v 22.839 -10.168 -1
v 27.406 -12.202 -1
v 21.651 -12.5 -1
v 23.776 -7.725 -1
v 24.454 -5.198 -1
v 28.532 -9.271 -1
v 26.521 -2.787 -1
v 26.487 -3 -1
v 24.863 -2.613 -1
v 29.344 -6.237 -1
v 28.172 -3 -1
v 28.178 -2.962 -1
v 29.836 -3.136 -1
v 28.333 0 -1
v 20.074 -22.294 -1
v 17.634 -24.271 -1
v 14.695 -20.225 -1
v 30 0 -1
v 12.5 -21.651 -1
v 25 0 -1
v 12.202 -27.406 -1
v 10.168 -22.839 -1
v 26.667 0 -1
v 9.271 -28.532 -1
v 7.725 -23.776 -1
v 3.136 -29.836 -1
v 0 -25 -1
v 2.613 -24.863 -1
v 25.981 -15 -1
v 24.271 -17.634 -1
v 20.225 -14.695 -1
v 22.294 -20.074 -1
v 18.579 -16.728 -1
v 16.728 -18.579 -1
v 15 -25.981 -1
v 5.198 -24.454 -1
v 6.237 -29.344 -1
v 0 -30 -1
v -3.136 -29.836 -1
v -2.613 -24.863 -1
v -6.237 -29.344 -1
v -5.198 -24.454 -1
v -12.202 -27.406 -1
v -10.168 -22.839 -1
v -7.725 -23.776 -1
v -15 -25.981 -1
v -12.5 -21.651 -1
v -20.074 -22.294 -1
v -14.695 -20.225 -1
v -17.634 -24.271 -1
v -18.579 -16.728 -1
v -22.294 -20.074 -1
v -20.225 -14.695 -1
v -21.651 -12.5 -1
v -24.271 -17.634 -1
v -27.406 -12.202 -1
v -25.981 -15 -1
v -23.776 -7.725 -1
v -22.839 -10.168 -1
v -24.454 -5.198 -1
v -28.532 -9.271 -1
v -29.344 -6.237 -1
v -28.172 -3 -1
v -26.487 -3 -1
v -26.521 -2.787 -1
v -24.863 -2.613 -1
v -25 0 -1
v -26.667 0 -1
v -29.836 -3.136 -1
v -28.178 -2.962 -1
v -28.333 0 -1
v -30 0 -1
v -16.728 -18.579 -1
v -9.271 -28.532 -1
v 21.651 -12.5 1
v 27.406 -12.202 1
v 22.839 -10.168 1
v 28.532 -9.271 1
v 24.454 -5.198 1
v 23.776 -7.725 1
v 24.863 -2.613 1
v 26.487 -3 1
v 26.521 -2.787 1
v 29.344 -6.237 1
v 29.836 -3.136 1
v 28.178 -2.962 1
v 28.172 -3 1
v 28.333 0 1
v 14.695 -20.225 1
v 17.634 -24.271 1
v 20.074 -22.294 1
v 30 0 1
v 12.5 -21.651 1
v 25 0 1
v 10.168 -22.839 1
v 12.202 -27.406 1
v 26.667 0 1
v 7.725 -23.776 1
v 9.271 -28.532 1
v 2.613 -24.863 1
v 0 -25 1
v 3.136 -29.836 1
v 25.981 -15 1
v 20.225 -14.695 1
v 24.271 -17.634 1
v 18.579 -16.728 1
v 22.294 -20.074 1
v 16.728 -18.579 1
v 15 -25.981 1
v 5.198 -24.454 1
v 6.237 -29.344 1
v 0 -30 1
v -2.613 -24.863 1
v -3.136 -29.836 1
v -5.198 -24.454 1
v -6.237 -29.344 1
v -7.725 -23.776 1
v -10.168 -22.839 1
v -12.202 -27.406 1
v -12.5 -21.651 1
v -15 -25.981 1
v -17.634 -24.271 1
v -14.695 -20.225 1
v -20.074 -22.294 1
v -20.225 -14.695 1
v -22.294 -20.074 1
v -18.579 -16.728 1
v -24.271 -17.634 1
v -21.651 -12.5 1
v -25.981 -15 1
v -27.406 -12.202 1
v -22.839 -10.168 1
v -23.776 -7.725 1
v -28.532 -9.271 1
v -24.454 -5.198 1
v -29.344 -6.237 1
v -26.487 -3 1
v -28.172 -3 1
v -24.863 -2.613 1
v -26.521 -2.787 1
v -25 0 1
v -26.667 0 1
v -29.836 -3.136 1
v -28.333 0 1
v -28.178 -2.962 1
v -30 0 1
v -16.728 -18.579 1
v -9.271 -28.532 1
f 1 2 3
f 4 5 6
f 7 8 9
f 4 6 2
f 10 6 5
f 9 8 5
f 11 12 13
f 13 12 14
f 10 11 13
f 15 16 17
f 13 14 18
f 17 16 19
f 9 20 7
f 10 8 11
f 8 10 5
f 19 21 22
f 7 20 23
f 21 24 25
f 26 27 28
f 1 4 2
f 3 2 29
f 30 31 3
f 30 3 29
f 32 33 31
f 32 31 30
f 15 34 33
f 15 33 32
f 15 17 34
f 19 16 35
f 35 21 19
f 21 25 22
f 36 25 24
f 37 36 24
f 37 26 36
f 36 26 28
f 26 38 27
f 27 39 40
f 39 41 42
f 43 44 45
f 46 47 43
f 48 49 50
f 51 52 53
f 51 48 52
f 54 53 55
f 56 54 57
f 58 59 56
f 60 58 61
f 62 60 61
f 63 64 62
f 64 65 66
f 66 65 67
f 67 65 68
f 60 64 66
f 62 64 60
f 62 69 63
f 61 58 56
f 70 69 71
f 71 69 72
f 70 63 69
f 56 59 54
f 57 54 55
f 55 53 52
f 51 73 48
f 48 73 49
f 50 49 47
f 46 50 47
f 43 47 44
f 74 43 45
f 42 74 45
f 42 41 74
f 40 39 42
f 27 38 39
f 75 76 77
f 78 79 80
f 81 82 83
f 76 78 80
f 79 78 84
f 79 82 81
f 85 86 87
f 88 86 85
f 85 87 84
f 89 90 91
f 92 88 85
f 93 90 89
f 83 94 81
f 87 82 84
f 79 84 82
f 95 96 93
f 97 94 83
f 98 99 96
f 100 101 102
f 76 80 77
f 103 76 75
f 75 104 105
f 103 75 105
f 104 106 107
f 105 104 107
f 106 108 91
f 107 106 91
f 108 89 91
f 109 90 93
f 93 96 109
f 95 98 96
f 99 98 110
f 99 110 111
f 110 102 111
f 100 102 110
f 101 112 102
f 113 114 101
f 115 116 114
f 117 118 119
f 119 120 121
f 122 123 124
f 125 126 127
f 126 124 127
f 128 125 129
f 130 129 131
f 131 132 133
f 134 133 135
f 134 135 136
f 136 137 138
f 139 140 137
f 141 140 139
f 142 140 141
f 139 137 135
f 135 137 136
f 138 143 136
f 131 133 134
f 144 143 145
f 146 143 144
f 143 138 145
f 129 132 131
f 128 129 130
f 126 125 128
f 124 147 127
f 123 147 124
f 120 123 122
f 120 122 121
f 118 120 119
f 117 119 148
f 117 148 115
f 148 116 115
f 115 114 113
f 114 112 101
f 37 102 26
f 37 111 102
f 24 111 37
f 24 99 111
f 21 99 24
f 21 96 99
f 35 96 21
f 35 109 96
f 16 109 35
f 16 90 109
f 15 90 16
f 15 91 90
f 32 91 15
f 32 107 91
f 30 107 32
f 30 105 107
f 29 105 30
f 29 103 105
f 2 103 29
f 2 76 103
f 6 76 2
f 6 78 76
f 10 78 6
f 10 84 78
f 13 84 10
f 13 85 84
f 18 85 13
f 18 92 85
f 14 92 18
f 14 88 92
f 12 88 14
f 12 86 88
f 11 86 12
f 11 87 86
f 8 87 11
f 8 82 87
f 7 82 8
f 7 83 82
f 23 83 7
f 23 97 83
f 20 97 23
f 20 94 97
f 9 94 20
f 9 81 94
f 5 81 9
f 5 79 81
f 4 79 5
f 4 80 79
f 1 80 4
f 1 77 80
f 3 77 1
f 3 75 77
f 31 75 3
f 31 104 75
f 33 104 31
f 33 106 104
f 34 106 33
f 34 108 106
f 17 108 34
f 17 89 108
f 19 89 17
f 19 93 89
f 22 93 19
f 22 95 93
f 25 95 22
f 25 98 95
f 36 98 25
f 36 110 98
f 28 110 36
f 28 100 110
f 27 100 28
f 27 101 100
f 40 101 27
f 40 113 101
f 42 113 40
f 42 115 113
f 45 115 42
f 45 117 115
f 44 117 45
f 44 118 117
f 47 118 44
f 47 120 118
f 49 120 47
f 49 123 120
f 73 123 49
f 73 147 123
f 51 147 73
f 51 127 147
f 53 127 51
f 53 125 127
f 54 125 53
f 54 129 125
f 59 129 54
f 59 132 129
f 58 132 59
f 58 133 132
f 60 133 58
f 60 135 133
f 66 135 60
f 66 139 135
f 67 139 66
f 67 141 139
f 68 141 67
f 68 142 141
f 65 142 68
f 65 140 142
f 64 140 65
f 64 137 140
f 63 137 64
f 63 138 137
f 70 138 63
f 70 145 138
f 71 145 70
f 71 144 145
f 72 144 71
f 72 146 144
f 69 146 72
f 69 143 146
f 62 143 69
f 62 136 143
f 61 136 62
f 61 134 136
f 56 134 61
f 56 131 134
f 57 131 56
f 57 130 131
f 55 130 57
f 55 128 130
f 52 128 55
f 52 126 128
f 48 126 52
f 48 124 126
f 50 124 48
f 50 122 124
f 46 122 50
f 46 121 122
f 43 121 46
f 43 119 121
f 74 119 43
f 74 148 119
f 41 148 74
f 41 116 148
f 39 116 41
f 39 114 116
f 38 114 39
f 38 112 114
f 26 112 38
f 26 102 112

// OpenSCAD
// file: ../slice.scad
eps = 0.1;

module cropboxes(r, deg, h=1) {
	degn = (deg % 360 > 0) ? deg % 360 : deg % 360 + 360;
	if (degn > 180)
		intersection_for(a = [0, 180 - degn])
			rotate(a) translate([-r, 0, -h/2]) cube([r*2, r*2, h]); 
	else
		for(a = [0, 180 - degn])
			rotate(a) translate([-r, 0, -h/2]) cube([r*2, r*2, h]); 
}

module cropsquares(r, deg) {
	degn = (deg % 360 > 0) ? deg % 360 : deg % 360 + 360;
	if (degn > 180)
		intersection_for(a = [0, 180 - degn])
			rotate(a) translate([-r, 0, 0]) square(r*2);
	else
		for(a = [0, 180 - degn])
			rotate(a) translate([-r, 0, 0]) square(r*2);
}

module slice(r = 10, deg = 30) {
	difference() {
		circle(r);
		cropsquares(r, deg);
	}
}

*slice(20, 190);

difference() {
	rotate_extrude(convexity=4) translate([10,0,0]) circle(r=3);
	cropboxes(13, 210, 6+eps);
}
// main file
use <../slice.scad>

$fa = 6;
$fs = 0.5;

total_width = 60;
arc_thickness = 5;
rad_tubes = 1;

module arc180(radius, thickness) {
	difference() {
		circle(radius);
		circle(radius - thickness);
		translate([-radius,0,0]) square(2*radius);
	}
}

linear_extrude(height=rad_tubes*2, convexity=4, center=true)
	difference() {
		arc180(total_width / 2, arc_thickness);
		intersection() {
			arc180(total_width / 2 - arc_thickness / 3, arc_thickness / 3);
			translate([-total_width, -total_width/20, 0])
				square(2*total_width);
		}
	}

/*
 ___
/   \
|   |
    |
   /
   |
*/
